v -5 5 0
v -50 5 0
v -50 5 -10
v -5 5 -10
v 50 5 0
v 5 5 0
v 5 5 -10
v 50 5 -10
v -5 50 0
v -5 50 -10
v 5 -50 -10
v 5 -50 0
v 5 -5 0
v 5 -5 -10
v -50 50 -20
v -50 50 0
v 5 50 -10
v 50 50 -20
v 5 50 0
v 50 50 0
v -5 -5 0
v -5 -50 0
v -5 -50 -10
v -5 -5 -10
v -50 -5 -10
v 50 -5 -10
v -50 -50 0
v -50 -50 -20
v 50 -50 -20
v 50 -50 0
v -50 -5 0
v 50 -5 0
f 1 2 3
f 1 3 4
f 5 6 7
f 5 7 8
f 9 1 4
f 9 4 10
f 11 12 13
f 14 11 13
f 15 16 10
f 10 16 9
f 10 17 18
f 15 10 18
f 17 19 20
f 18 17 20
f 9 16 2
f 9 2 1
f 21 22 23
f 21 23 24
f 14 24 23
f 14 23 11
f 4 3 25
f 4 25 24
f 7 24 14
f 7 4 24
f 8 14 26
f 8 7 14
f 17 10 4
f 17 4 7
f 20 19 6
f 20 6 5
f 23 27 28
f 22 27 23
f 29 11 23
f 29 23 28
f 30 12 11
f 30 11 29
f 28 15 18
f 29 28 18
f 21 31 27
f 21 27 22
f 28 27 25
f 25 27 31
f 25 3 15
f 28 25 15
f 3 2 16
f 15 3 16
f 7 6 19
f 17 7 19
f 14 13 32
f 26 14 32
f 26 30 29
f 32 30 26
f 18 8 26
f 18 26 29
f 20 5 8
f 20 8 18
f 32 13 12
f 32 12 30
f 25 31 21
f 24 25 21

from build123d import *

# Parameters (mm, degrees)
SKETCH1_W      = 100
SKETCH1_H      = 100
EXTRUDE1_DEPTH = 20
SKETCH2_W      = 10
SKETCH2_H      = 100
EXTRUDE2_DEPTH = 10
SKETCH3_W      = 100
SKETCH3_H      = 10
EXTRUDE3_DEPTH = 10


with BuildPart() as part:
    # Sketch1 → Extrude1 (new body)
    with BuildSketch(Plane.XY):
        Rectangle(SKETCH1_W, SKETCH1_H)
    extrude(amount=-EXTRUDE1_DEPTH)

    # Sketch2 → Extrude2 (cut)
    with BuildSketch(Plane.XY):
        Rectangle(SKETCH2_W, SKETCH2_H)
    extrude(amount=-EXTRUDE2_DEPTH, mode=Mode.SUBTRACT)

    # Sketch3 → Extrude3 (cut)
    with BuildSketch(Plane.XY):
        Rectangle(SKETCH3_W, SKETCH3_H)
    extrude(amount=-EXTRUDE3_DEPTH, mode=Mode.SUBTRACT)


solid = part.part
